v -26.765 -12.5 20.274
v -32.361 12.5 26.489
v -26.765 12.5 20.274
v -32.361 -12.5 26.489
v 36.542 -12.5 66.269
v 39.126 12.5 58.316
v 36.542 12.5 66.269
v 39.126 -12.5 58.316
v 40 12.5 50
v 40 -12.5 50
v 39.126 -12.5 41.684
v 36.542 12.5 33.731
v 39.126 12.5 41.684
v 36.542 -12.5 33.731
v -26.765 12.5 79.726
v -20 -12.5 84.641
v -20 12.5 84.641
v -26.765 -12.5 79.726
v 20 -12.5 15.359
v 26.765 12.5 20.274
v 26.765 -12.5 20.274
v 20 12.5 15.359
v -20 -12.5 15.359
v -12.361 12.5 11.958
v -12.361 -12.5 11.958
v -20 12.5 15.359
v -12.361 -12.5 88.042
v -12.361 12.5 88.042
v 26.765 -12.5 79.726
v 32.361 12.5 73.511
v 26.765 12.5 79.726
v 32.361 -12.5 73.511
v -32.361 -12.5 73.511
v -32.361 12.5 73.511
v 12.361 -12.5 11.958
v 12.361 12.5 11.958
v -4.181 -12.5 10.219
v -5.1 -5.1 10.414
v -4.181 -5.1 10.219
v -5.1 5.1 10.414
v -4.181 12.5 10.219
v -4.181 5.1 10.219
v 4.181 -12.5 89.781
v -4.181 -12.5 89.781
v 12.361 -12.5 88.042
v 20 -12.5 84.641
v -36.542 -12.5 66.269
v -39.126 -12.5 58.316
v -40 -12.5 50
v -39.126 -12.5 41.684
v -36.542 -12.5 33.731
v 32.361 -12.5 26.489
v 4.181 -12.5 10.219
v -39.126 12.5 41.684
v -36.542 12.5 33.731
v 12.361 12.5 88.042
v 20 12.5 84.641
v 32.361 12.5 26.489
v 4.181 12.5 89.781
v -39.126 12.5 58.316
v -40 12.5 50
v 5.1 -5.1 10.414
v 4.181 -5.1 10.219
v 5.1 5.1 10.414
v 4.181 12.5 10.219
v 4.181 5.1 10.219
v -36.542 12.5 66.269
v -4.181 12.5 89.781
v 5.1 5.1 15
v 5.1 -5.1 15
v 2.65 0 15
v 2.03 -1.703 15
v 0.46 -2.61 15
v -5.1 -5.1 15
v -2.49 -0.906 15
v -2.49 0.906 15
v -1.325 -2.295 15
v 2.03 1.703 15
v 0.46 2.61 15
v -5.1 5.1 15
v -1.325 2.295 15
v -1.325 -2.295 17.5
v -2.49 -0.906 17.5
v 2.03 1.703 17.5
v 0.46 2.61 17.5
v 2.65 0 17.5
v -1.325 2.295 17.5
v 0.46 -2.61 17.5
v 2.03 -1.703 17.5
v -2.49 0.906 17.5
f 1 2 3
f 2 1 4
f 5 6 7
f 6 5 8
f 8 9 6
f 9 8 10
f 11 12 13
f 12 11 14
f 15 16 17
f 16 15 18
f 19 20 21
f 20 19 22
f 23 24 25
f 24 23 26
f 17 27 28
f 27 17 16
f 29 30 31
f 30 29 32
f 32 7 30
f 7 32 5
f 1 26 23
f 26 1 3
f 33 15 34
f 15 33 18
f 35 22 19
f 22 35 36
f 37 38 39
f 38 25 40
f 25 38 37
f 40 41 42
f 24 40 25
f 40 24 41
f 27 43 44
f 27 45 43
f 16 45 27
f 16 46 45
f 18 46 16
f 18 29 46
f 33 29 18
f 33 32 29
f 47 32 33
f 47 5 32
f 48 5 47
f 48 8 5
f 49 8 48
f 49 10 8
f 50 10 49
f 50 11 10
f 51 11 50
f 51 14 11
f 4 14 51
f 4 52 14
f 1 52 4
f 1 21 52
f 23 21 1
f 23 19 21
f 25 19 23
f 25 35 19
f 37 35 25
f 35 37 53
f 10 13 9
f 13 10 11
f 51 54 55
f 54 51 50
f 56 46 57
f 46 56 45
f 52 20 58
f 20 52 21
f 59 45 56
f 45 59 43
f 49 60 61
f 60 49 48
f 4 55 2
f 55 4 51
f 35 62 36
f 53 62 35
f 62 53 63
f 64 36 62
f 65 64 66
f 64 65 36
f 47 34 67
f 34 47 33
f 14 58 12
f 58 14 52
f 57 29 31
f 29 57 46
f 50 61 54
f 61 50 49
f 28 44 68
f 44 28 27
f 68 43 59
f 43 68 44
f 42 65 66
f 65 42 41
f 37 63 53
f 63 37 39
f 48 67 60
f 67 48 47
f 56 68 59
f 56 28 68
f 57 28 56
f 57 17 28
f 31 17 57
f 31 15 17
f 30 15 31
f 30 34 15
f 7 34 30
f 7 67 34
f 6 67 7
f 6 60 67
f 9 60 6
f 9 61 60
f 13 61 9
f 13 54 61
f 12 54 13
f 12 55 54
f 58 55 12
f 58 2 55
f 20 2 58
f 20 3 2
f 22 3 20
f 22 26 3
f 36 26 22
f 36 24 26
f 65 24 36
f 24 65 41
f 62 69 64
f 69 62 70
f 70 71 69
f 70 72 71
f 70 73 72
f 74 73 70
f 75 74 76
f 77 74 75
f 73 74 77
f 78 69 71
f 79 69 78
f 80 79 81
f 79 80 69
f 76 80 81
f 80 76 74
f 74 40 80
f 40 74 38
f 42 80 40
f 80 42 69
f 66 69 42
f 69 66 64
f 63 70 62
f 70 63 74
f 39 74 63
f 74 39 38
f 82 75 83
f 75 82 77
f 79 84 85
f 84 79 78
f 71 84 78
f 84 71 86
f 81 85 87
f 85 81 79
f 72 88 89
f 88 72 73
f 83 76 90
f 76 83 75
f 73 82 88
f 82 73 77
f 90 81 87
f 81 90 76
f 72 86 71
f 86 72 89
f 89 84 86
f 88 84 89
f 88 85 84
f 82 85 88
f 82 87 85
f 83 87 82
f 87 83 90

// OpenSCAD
flogowithhole();

//h ole();

module flogowithhole()
{
    difference()
    {
    translate([0,12.5,50])
    rotate([90,0,0])
    flogo();
    nohole();
    }
}


module flogo()
{
    difference()
    {
    cylinder(r=40, h=25);
    scale([.6,.6,1])
    translate([-90,-90,1])
    linear_extrude(height=35)
    scale([20,20,20])
    import("FLOGO.dxf");
    }
}
module nohole()
{
difference()
{
union()
    {
standBTC();
    translate([-5.1,-5.1,0])
    cube([10.2,10.2,15]);
    cylinder(r=5.3/2, h=17.5);
    }
  //  cylinder(r=5.3/2, h=18);
    
    translate([37,37,0])
    cylinder(r=3.3/2, h=9);
    translate([-37,37,0])
    cylinder(r=3.3/2, h=9);
    translate([37,-37,0])
    cylinder(r=3.3/2, h=9);
    translate([-37,-37,0])
    cylinder(r=3.3/2, h=9);
    

}  
}
module hole()
{
difference()
{
union()
    {
standBTC();
    translate([-5,-5,0])
    cube([10,10,15]);
  //  cylinder(r=5.3/2, h=20);
    }
    cylinder(r=5.3/2, h=18);
    
    translate([37,37,0])
    cylinder(r=3.3/2, h=9);
    translate([-37,37,0])
    cylinder(r=3.3/2, h=9);
    translate([37,-37,0])
    cylinder(r=3.3/2, h=9);
    translate([-37,-37,0])
    cylinder(r=3.3/2, h=9);
    

}  
}
module standBTC()
{
translate([-40,-40,0])
cube([80,80,4]);
//coin();
}
module coin()
{


rotate([0,0,45])
translate([0,0,43])
    {
union()
        {
logo();
translate([0,5,0])
rotate([90,0,0])
cylinder(h=10, r=50);
            
}
}
}




module oldlogo()
{
import("logo3.stl");
}
module logo()
{
    import("btclogo2.stl");
    }
